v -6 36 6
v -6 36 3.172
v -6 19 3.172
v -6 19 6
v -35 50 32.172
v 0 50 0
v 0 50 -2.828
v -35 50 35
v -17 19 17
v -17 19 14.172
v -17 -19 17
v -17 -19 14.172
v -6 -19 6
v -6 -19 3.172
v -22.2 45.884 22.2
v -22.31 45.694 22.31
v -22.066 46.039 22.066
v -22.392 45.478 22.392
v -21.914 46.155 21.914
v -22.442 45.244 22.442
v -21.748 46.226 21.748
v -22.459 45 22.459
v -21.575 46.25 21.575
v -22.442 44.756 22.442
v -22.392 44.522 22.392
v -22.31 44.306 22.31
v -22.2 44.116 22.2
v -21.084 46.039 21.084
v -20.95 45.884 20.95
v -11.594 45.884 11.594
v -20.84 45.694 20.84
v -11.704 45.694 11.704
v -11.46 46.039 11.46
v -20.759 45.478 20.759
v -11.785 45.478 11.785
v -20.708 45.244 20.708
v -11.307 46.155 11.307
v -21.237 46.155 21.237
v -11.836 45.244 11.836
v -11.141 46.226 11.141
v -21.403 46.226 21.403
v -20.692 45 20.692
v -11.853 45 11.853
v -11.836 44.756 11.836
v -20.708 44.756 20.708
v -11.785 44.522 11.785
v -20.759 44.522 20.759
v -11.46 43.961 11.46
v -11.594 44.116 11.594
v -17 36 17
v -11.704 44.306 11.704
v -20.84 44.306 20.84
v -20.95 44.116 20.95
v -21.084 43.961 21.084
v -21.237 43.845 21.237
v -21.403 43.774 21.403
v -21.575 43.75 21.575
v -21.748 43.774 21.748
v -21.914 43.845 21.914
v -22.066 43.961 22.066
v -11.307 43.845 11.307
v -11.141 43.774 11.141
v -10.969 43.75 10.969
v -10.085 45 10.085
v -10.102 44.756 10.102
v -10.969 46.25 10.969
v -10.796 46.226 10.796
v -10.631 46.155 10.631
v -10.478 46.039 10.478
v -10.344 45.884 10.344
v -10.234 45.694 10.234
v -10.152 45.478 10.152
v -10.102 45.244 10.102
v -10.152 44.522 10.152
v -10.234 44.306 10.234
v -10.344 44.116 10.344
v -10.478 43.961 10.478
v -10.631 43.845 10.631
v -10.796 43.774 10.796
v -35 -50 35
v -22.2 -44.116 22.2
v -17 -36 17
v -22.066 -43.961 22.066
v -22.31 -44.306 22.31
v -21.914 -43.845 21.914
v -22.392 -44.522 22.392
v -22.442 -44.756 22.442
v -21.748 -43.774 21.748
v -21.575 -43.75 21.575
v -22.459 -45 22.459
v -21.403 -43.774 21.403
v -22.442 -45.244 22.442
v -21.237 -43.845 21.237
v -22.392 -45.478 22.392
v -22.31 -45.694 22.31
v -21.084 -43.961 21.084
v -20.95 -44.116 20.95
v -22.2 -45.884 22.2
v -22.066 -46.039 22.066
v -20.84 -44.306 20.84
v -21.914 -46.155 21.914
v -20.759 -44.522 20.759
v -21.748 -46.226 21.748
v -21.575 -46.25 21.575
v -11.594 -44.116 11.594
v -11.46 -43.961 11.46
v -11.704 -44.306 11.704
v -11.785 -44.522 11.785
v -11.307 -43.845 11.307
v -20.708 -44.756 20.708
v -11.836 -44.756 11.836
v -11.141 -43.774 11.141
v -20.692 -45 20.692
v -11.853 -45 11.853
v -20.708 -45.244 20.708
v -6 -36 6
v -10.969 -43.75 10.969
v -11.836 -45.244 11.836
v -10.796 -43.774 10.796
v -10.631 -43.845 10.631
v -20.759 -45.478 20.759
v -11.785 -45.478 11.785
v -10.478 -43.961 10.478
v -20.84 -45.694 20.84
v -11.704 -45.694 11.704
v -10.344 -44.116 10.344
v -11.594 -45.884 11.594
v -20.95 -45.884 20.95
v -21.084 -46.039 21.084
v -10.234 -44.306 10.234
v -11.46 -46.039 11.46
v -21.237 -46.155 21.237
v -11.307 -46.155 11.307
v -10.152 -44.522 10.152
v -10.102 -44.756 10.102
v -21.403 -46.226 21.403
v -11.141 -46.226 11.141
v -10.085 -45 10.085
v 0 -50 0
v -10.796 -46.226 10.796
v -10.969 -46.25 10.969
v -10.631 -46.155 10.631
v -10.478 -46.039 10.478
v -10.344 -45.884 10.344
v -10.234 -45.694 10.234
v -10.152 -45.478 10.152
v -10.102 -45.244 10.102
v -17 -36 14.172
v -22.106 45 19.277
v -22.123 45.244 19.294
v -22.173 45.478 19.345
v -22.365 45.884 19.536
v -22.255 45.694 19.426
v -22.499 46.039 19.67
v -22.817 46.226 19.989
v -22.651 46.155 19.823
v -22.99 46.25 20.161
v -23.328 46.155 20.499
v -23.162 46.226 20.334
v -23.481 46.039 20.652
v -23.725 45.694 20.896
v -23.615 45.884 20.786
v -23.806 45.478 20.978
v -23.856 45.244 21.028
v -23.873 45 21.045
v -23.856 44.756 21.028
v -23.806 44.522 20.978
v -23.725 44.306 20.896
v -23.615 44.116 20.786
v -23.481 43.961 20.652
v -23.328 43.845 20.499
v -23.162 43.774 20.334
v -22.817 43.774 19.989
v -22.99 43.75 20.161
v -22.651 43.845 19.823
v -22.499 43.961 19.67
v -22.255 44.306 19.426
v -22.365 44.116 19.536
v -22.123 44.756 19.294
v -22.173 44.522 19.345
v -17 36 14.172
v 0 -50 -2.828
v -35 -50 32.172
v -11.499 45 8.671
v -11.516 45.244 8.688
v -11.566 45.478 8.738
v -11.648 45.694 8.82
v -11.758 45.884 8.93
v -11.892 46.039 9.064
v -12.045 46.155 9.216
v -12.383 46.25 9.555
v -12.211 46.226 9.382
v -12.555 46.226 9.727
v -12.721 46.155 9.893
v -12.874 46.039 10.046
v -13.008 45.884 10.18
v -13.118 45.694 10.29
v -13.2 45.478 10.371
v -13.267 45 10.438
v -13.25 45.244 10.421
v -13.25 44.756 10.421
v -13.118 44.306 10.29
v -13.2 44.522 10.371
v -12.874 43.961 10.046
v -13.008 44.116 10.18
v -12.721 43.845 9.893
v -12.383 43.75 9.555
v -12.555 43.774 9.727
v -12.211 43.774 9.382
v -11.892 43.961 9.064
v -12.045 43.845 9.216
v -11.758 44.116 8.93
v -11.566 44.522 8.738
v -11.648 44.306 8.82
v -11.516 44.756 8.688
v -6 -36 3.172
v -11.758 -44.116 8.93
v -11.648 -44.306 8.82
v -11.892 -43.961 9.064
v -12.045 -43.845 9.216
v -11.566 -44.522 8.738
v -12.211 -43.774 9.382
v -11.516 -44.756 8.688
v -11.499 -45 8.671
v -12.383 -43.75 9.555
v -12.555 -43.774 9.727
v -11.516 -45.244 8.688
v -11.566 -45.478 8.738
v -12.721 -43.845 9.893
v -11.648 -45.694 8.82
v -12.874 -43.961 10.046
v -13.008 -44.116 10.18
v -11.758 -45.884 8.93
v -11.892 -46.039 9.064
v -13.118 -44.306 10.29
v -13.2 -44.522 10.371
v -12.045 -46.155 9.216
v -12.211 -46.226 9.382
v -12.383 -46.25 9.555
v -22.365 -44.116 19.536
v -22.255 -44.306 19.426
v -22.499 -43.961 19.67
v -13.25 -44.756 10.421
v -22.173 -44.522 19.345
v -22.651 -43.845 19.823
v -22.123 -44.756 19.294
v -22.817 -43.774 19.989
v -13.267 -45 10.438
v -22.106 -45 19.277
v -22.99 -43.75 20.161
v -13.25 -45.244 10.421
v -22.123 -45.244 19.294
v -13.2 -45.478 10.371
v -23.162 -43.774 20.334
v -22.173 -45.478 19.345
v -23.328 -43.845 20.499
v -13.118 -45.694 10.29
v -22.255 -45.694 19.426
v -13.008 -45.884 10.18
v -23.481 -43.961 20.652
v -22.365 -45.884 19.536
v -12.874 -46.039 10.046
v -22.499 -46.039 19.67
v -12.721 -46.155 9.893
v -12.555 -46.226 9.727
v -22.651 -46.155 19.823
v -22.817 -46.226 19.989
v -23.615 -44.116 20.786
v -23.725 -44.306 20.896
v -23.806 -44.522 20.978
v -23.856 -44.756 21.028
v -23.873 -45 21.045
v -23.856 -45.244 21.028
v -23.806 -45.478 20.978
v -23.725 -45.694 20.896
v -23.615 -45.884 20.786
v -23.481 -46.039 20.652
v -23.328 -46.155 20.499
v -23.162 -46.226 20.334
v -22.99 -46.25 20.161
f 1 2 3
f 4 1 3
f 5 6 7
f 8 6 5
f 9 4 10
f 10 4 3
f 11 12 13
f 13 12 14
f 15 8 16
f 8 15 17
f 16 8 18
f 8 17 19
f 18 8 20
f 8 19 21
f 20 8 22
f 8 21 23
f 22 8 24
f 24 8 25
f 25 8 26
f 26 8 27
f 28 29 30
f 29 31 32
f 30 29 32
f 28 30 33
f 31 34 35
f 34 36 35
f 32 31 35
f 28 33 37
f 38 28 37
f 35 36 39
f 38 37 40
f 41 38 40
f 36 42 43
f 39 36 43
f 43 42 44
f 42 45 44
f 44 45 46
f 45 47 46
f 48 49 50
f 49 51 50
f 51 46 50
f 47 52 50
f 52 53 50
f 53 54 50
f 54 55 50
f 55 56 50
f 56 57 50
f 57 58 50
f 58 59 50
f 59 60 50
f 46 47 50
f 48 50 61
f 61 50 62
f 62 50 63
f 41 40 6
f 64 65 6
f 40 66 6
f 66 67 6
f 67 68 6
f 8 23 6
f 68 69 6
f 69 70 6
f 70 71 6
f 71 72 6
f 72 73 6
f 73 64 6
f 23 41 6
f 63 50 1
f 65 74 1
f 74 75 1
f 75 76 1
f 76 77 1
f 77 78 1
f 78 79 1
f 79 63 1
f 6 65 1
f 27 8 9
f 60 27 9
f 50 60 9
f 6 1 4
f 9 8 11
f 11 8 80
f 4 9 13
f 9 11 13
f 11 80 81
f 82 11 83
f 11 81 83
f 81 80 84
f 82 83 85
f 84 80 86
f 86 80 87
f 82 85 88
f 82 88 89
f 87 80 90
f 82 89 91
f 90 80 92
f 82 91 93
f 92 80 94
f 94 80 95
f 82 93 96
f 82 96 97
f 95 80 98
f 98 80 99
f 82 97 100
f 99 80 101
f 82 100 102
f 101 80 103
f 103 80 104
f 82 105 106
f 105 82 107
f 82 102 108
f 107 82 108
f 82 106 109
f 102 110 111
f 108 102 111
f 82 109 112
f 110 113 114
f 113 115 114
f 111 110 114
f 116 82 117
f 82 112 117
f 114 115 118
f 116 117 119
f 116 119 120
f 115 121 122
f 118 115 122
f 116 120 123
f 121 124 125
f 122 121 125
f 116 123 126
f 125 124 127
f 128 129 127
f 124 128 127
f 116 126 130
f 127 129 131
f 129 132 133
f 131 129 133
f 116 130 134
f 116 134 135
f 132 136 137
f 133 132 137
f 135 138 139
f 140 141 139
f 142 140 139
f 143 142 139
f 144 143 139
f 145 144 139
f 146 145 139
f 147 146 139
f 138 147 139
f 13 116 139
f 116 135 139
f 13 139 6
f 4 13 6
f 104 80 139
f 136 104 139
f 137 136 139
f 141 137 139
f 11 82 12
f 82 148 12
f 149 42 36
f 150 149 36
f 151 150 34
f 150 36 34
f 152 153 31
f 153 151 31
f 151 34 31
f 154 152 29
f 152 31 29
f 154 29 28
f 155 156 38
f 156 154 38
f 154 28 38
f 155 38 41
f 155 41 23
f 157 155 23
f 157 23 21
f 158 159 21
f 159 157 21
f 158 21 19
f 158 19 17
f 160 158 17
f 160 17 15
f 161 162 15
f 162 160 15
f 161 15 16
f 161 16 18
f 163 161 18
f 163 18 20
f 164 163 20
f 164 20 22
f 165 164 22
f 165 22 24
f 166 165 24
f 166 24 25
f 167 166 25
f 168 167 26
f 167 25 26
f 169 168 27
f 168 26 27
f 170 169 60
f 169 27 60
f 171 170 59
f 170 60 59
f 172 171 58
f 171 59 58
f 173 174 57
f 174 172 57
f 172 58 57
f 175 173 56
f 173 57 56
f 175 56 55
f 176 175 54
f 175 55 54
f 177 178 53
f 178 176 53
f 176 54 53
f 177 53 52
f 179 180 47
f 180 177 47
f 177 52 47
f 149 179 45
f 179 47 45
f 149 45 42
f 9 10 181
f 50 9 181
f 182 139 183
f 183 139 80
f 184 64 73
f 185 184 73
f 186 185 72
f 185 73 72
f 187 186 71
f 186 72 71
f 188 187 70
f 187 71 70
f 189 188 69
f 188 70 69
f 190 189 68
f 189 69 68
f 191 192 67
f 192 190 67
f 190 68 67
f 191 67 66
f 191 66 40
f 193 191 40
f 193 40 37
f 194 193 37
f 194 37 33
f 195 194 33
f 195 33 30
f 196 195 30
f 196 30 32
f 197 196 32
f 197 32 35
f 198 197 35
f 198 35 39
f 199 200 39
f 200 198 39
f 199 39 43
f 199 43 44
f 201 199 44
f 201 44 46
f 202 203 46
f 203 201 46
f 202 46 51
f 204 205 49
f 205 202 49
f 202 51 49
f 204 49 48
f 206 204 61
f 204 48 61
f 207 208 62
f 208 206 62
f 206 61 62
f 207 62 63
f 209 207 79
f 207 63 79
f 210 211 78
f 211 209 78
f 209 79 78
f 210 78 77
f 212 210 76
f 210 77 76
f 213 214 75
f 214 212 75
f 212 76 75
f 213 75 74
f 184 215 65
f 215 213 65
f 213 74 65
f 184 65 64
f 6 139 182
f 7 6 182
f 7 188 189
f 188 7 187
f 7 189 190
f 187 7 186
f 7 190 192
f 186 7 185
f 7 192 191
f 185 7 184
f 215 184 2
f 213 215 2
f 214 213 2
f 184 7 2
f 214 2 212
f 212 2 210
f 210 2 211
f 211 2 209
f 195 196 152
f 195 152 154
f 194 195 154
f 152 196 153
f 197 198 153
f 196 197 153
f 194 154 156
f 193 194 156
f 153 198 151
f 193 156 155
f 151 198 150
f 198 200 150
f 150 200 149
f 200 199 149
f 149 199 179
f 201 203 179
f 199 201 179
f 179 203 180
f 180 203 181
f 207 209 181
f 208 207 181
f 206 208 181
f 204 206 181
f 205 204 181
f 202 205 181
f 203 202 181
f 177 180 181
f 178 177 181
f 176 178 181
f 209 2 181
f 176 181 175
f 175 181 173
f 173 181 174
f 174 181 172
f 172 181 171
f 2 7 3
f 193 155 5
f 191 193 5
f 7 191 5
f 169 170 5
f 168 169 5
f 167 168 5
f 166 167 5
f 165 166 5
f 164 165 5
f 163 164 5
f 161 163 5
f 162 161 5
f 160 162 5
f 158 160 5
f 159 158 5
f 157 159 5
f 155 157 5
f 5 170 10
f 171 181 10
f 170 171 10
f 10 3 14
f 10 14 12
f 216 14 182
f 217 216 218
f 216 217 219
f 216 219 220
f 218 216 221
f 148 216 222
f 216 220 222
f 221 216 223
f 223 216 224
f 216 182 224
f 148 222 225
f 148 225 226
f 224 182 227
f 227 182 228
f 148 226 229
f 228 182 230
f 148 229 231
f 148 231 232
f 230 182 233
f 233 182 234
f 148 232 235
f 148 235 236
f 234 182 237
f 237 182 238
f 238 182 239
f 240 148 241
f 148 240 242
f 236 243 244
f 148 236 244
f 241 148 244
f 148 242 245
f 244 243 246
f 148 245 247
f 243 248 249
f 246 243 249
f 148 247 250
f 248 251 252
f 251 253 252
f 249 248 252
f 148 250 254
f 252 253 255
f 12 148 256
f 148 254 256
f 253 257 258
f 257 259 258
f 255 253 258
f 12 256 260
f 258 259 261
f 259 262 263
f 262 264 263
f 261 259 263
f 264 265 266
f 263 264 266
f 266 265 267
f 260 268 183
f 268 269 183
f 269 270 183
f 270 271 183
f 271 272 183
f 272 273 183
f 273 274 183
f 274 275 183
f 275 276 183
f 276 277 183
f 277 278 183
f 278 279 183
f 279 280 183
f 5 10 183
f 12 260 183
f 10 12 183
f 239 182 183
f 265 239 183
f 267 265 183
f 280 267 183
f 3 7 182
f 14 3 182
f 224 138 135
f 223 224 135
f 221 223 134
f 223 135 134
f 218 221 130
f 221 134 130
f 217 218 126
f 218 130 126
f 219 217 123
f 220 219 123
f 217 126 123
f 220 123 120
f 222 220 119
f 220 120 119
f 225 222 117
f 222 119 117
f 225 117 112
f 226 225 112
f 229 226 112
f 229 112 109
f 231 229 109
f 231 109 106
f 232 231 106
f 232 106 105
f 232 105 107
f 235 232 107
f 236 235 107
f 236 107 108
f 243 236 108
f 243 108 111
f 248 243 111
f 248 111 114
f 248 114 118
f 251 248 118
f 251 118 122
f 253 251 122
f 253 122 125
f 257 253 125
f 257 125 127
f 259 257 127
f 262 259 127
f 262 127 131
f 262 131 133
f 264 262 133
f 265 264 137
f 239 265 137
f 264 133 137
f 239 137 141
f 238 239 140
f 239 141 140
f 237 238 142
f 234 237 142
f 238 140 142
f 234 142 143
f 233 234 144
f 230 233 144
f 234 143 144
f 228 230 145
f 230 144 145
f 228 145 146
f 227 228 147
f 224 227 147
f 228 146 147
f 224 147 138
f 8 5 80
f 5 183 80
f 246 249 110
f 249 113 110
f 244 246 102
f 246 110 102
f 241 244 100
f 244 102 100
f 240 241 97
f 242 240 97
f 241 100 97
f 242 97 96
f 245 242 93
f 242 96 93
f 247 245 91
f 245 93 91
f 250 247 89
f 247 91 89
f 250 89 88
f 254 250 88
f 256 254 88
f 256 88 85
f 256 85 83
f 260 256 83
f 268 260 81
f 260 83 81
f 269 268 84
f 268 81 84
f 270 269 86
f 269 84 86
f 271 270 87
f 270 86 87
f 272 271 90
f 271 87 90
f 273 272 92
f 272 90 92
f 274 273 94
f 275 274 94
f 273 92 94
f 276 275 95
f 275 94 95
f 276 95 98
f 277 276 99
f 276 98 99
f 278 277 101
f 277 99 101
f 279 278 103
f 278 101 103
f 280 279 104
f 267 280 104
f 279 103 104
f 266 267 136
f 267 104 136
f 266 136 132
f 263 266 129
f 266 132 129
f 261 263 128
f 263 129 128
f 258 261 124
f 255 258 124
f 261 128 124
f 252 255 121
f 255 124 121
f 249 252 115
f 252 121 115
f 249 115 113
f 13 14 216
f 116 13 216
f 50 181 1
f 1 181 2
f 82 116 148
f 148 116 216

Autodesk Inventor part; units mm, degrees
ref_plane "YZ Plane" through (0, 0, 0) normal (1, 0, 0) x (0, 1, 0)
ref_plane "XZ Plane" through (0, 0, 0) normal (0, 1, 0) x (-1, 0, 0)
ref_plane "XY Plane" through (0, 0, 0) normal (0, 0, 1) x (1, 0, 0)
sketch "Sketch1" plane through (0, 0, 0) normal (0, 1, 0) x (-1, 0, 0)
  line L0 (0, 0) -> (0, -2.8284)
  line L1 (0, -2.8284) -> (29, 26.1716)
  line L2 (29, 26.1716) -> (29, 29)
  line L3 (29, 29) -> (0, 0)
  line L4 (29, 26.1716) -> (35, 32.1716)
  line L5 (35, 32.1716) -> (35, 35)
  line L6 (35, 35) -> (29, 29)
  dimension "d2" = 29
  dimension "d3" = 45
  dimension "d6" = 2
  dimension "d23" = 6
  dimension "d24" = 45
  dimension "d25" = 45
extrude "Extrusion1" add sketch "Sketch1" along normal mid plane 100 contours L3 L2 L1 L0
sketch "Sketch2" plane through (0, 0, 0) normal (0, 0, 1) x (1, 0, 0)
  line L0 (-17, 36) -> (-6, 36)
  line L1 (-6, 36) -> (-6, 19)
  line L2 (-6, 19) -> (-17, 19)
  line L3 (-17, 19) -> (-17, 36)
  line L4 (0, 50) -> (-29, 50) projected
  line L5 (0, -50) -> (0, 50) projected
  point P0 (0, 0)
  dimension "d7" = 14
  dimension "d8" = 17
  dimension "d9" = 11
  dimension "d11" = 6
extrude "Extrusion2" cut sketch "Sketch2" along normal up to next
mirror "Mirror1" about plane through (0, 0, 0) normal (0, 1, 0) of "Extrusion2"
sketch "Sketch3" plane through (0, -50, 0) normal (0.7071, 0, 0.7071) x (0.7071, 0, -0.7071)
  circle A0 centre (-30.5122, 5) radius 1.25
  circle A1 centre (-15.5122, 5) radius 1.25
  line L0 (-39.0122, 0) -> (-39.0122, 100) projected
  line L1 (-41.0122, 0) -> (-41.0122, 100) projected
  line L2 (0, 0) -> (-41.0122, 0) projected
  point P0 (0, 50)
  dimension "d15" = 5
  dimension "d16" = 2.5
  dimension "d17" = 15
  dimension "d18" = 2.5
  dimension "d19" = 5
  dimension "d20" = 10.5
extrude "Extrusion3" cut sketch "Sketch3" against normal up to next
mirror "Mirror2" about plane through (0, 0, 0) normal (0, 1, 0) of "Extrusion3"
extrude "Extrusion4" add sketch "Sketch1" along normal mid plane 100 contours L6 L5 L4 L2
properties part number "Front_Dluzszy_2"
